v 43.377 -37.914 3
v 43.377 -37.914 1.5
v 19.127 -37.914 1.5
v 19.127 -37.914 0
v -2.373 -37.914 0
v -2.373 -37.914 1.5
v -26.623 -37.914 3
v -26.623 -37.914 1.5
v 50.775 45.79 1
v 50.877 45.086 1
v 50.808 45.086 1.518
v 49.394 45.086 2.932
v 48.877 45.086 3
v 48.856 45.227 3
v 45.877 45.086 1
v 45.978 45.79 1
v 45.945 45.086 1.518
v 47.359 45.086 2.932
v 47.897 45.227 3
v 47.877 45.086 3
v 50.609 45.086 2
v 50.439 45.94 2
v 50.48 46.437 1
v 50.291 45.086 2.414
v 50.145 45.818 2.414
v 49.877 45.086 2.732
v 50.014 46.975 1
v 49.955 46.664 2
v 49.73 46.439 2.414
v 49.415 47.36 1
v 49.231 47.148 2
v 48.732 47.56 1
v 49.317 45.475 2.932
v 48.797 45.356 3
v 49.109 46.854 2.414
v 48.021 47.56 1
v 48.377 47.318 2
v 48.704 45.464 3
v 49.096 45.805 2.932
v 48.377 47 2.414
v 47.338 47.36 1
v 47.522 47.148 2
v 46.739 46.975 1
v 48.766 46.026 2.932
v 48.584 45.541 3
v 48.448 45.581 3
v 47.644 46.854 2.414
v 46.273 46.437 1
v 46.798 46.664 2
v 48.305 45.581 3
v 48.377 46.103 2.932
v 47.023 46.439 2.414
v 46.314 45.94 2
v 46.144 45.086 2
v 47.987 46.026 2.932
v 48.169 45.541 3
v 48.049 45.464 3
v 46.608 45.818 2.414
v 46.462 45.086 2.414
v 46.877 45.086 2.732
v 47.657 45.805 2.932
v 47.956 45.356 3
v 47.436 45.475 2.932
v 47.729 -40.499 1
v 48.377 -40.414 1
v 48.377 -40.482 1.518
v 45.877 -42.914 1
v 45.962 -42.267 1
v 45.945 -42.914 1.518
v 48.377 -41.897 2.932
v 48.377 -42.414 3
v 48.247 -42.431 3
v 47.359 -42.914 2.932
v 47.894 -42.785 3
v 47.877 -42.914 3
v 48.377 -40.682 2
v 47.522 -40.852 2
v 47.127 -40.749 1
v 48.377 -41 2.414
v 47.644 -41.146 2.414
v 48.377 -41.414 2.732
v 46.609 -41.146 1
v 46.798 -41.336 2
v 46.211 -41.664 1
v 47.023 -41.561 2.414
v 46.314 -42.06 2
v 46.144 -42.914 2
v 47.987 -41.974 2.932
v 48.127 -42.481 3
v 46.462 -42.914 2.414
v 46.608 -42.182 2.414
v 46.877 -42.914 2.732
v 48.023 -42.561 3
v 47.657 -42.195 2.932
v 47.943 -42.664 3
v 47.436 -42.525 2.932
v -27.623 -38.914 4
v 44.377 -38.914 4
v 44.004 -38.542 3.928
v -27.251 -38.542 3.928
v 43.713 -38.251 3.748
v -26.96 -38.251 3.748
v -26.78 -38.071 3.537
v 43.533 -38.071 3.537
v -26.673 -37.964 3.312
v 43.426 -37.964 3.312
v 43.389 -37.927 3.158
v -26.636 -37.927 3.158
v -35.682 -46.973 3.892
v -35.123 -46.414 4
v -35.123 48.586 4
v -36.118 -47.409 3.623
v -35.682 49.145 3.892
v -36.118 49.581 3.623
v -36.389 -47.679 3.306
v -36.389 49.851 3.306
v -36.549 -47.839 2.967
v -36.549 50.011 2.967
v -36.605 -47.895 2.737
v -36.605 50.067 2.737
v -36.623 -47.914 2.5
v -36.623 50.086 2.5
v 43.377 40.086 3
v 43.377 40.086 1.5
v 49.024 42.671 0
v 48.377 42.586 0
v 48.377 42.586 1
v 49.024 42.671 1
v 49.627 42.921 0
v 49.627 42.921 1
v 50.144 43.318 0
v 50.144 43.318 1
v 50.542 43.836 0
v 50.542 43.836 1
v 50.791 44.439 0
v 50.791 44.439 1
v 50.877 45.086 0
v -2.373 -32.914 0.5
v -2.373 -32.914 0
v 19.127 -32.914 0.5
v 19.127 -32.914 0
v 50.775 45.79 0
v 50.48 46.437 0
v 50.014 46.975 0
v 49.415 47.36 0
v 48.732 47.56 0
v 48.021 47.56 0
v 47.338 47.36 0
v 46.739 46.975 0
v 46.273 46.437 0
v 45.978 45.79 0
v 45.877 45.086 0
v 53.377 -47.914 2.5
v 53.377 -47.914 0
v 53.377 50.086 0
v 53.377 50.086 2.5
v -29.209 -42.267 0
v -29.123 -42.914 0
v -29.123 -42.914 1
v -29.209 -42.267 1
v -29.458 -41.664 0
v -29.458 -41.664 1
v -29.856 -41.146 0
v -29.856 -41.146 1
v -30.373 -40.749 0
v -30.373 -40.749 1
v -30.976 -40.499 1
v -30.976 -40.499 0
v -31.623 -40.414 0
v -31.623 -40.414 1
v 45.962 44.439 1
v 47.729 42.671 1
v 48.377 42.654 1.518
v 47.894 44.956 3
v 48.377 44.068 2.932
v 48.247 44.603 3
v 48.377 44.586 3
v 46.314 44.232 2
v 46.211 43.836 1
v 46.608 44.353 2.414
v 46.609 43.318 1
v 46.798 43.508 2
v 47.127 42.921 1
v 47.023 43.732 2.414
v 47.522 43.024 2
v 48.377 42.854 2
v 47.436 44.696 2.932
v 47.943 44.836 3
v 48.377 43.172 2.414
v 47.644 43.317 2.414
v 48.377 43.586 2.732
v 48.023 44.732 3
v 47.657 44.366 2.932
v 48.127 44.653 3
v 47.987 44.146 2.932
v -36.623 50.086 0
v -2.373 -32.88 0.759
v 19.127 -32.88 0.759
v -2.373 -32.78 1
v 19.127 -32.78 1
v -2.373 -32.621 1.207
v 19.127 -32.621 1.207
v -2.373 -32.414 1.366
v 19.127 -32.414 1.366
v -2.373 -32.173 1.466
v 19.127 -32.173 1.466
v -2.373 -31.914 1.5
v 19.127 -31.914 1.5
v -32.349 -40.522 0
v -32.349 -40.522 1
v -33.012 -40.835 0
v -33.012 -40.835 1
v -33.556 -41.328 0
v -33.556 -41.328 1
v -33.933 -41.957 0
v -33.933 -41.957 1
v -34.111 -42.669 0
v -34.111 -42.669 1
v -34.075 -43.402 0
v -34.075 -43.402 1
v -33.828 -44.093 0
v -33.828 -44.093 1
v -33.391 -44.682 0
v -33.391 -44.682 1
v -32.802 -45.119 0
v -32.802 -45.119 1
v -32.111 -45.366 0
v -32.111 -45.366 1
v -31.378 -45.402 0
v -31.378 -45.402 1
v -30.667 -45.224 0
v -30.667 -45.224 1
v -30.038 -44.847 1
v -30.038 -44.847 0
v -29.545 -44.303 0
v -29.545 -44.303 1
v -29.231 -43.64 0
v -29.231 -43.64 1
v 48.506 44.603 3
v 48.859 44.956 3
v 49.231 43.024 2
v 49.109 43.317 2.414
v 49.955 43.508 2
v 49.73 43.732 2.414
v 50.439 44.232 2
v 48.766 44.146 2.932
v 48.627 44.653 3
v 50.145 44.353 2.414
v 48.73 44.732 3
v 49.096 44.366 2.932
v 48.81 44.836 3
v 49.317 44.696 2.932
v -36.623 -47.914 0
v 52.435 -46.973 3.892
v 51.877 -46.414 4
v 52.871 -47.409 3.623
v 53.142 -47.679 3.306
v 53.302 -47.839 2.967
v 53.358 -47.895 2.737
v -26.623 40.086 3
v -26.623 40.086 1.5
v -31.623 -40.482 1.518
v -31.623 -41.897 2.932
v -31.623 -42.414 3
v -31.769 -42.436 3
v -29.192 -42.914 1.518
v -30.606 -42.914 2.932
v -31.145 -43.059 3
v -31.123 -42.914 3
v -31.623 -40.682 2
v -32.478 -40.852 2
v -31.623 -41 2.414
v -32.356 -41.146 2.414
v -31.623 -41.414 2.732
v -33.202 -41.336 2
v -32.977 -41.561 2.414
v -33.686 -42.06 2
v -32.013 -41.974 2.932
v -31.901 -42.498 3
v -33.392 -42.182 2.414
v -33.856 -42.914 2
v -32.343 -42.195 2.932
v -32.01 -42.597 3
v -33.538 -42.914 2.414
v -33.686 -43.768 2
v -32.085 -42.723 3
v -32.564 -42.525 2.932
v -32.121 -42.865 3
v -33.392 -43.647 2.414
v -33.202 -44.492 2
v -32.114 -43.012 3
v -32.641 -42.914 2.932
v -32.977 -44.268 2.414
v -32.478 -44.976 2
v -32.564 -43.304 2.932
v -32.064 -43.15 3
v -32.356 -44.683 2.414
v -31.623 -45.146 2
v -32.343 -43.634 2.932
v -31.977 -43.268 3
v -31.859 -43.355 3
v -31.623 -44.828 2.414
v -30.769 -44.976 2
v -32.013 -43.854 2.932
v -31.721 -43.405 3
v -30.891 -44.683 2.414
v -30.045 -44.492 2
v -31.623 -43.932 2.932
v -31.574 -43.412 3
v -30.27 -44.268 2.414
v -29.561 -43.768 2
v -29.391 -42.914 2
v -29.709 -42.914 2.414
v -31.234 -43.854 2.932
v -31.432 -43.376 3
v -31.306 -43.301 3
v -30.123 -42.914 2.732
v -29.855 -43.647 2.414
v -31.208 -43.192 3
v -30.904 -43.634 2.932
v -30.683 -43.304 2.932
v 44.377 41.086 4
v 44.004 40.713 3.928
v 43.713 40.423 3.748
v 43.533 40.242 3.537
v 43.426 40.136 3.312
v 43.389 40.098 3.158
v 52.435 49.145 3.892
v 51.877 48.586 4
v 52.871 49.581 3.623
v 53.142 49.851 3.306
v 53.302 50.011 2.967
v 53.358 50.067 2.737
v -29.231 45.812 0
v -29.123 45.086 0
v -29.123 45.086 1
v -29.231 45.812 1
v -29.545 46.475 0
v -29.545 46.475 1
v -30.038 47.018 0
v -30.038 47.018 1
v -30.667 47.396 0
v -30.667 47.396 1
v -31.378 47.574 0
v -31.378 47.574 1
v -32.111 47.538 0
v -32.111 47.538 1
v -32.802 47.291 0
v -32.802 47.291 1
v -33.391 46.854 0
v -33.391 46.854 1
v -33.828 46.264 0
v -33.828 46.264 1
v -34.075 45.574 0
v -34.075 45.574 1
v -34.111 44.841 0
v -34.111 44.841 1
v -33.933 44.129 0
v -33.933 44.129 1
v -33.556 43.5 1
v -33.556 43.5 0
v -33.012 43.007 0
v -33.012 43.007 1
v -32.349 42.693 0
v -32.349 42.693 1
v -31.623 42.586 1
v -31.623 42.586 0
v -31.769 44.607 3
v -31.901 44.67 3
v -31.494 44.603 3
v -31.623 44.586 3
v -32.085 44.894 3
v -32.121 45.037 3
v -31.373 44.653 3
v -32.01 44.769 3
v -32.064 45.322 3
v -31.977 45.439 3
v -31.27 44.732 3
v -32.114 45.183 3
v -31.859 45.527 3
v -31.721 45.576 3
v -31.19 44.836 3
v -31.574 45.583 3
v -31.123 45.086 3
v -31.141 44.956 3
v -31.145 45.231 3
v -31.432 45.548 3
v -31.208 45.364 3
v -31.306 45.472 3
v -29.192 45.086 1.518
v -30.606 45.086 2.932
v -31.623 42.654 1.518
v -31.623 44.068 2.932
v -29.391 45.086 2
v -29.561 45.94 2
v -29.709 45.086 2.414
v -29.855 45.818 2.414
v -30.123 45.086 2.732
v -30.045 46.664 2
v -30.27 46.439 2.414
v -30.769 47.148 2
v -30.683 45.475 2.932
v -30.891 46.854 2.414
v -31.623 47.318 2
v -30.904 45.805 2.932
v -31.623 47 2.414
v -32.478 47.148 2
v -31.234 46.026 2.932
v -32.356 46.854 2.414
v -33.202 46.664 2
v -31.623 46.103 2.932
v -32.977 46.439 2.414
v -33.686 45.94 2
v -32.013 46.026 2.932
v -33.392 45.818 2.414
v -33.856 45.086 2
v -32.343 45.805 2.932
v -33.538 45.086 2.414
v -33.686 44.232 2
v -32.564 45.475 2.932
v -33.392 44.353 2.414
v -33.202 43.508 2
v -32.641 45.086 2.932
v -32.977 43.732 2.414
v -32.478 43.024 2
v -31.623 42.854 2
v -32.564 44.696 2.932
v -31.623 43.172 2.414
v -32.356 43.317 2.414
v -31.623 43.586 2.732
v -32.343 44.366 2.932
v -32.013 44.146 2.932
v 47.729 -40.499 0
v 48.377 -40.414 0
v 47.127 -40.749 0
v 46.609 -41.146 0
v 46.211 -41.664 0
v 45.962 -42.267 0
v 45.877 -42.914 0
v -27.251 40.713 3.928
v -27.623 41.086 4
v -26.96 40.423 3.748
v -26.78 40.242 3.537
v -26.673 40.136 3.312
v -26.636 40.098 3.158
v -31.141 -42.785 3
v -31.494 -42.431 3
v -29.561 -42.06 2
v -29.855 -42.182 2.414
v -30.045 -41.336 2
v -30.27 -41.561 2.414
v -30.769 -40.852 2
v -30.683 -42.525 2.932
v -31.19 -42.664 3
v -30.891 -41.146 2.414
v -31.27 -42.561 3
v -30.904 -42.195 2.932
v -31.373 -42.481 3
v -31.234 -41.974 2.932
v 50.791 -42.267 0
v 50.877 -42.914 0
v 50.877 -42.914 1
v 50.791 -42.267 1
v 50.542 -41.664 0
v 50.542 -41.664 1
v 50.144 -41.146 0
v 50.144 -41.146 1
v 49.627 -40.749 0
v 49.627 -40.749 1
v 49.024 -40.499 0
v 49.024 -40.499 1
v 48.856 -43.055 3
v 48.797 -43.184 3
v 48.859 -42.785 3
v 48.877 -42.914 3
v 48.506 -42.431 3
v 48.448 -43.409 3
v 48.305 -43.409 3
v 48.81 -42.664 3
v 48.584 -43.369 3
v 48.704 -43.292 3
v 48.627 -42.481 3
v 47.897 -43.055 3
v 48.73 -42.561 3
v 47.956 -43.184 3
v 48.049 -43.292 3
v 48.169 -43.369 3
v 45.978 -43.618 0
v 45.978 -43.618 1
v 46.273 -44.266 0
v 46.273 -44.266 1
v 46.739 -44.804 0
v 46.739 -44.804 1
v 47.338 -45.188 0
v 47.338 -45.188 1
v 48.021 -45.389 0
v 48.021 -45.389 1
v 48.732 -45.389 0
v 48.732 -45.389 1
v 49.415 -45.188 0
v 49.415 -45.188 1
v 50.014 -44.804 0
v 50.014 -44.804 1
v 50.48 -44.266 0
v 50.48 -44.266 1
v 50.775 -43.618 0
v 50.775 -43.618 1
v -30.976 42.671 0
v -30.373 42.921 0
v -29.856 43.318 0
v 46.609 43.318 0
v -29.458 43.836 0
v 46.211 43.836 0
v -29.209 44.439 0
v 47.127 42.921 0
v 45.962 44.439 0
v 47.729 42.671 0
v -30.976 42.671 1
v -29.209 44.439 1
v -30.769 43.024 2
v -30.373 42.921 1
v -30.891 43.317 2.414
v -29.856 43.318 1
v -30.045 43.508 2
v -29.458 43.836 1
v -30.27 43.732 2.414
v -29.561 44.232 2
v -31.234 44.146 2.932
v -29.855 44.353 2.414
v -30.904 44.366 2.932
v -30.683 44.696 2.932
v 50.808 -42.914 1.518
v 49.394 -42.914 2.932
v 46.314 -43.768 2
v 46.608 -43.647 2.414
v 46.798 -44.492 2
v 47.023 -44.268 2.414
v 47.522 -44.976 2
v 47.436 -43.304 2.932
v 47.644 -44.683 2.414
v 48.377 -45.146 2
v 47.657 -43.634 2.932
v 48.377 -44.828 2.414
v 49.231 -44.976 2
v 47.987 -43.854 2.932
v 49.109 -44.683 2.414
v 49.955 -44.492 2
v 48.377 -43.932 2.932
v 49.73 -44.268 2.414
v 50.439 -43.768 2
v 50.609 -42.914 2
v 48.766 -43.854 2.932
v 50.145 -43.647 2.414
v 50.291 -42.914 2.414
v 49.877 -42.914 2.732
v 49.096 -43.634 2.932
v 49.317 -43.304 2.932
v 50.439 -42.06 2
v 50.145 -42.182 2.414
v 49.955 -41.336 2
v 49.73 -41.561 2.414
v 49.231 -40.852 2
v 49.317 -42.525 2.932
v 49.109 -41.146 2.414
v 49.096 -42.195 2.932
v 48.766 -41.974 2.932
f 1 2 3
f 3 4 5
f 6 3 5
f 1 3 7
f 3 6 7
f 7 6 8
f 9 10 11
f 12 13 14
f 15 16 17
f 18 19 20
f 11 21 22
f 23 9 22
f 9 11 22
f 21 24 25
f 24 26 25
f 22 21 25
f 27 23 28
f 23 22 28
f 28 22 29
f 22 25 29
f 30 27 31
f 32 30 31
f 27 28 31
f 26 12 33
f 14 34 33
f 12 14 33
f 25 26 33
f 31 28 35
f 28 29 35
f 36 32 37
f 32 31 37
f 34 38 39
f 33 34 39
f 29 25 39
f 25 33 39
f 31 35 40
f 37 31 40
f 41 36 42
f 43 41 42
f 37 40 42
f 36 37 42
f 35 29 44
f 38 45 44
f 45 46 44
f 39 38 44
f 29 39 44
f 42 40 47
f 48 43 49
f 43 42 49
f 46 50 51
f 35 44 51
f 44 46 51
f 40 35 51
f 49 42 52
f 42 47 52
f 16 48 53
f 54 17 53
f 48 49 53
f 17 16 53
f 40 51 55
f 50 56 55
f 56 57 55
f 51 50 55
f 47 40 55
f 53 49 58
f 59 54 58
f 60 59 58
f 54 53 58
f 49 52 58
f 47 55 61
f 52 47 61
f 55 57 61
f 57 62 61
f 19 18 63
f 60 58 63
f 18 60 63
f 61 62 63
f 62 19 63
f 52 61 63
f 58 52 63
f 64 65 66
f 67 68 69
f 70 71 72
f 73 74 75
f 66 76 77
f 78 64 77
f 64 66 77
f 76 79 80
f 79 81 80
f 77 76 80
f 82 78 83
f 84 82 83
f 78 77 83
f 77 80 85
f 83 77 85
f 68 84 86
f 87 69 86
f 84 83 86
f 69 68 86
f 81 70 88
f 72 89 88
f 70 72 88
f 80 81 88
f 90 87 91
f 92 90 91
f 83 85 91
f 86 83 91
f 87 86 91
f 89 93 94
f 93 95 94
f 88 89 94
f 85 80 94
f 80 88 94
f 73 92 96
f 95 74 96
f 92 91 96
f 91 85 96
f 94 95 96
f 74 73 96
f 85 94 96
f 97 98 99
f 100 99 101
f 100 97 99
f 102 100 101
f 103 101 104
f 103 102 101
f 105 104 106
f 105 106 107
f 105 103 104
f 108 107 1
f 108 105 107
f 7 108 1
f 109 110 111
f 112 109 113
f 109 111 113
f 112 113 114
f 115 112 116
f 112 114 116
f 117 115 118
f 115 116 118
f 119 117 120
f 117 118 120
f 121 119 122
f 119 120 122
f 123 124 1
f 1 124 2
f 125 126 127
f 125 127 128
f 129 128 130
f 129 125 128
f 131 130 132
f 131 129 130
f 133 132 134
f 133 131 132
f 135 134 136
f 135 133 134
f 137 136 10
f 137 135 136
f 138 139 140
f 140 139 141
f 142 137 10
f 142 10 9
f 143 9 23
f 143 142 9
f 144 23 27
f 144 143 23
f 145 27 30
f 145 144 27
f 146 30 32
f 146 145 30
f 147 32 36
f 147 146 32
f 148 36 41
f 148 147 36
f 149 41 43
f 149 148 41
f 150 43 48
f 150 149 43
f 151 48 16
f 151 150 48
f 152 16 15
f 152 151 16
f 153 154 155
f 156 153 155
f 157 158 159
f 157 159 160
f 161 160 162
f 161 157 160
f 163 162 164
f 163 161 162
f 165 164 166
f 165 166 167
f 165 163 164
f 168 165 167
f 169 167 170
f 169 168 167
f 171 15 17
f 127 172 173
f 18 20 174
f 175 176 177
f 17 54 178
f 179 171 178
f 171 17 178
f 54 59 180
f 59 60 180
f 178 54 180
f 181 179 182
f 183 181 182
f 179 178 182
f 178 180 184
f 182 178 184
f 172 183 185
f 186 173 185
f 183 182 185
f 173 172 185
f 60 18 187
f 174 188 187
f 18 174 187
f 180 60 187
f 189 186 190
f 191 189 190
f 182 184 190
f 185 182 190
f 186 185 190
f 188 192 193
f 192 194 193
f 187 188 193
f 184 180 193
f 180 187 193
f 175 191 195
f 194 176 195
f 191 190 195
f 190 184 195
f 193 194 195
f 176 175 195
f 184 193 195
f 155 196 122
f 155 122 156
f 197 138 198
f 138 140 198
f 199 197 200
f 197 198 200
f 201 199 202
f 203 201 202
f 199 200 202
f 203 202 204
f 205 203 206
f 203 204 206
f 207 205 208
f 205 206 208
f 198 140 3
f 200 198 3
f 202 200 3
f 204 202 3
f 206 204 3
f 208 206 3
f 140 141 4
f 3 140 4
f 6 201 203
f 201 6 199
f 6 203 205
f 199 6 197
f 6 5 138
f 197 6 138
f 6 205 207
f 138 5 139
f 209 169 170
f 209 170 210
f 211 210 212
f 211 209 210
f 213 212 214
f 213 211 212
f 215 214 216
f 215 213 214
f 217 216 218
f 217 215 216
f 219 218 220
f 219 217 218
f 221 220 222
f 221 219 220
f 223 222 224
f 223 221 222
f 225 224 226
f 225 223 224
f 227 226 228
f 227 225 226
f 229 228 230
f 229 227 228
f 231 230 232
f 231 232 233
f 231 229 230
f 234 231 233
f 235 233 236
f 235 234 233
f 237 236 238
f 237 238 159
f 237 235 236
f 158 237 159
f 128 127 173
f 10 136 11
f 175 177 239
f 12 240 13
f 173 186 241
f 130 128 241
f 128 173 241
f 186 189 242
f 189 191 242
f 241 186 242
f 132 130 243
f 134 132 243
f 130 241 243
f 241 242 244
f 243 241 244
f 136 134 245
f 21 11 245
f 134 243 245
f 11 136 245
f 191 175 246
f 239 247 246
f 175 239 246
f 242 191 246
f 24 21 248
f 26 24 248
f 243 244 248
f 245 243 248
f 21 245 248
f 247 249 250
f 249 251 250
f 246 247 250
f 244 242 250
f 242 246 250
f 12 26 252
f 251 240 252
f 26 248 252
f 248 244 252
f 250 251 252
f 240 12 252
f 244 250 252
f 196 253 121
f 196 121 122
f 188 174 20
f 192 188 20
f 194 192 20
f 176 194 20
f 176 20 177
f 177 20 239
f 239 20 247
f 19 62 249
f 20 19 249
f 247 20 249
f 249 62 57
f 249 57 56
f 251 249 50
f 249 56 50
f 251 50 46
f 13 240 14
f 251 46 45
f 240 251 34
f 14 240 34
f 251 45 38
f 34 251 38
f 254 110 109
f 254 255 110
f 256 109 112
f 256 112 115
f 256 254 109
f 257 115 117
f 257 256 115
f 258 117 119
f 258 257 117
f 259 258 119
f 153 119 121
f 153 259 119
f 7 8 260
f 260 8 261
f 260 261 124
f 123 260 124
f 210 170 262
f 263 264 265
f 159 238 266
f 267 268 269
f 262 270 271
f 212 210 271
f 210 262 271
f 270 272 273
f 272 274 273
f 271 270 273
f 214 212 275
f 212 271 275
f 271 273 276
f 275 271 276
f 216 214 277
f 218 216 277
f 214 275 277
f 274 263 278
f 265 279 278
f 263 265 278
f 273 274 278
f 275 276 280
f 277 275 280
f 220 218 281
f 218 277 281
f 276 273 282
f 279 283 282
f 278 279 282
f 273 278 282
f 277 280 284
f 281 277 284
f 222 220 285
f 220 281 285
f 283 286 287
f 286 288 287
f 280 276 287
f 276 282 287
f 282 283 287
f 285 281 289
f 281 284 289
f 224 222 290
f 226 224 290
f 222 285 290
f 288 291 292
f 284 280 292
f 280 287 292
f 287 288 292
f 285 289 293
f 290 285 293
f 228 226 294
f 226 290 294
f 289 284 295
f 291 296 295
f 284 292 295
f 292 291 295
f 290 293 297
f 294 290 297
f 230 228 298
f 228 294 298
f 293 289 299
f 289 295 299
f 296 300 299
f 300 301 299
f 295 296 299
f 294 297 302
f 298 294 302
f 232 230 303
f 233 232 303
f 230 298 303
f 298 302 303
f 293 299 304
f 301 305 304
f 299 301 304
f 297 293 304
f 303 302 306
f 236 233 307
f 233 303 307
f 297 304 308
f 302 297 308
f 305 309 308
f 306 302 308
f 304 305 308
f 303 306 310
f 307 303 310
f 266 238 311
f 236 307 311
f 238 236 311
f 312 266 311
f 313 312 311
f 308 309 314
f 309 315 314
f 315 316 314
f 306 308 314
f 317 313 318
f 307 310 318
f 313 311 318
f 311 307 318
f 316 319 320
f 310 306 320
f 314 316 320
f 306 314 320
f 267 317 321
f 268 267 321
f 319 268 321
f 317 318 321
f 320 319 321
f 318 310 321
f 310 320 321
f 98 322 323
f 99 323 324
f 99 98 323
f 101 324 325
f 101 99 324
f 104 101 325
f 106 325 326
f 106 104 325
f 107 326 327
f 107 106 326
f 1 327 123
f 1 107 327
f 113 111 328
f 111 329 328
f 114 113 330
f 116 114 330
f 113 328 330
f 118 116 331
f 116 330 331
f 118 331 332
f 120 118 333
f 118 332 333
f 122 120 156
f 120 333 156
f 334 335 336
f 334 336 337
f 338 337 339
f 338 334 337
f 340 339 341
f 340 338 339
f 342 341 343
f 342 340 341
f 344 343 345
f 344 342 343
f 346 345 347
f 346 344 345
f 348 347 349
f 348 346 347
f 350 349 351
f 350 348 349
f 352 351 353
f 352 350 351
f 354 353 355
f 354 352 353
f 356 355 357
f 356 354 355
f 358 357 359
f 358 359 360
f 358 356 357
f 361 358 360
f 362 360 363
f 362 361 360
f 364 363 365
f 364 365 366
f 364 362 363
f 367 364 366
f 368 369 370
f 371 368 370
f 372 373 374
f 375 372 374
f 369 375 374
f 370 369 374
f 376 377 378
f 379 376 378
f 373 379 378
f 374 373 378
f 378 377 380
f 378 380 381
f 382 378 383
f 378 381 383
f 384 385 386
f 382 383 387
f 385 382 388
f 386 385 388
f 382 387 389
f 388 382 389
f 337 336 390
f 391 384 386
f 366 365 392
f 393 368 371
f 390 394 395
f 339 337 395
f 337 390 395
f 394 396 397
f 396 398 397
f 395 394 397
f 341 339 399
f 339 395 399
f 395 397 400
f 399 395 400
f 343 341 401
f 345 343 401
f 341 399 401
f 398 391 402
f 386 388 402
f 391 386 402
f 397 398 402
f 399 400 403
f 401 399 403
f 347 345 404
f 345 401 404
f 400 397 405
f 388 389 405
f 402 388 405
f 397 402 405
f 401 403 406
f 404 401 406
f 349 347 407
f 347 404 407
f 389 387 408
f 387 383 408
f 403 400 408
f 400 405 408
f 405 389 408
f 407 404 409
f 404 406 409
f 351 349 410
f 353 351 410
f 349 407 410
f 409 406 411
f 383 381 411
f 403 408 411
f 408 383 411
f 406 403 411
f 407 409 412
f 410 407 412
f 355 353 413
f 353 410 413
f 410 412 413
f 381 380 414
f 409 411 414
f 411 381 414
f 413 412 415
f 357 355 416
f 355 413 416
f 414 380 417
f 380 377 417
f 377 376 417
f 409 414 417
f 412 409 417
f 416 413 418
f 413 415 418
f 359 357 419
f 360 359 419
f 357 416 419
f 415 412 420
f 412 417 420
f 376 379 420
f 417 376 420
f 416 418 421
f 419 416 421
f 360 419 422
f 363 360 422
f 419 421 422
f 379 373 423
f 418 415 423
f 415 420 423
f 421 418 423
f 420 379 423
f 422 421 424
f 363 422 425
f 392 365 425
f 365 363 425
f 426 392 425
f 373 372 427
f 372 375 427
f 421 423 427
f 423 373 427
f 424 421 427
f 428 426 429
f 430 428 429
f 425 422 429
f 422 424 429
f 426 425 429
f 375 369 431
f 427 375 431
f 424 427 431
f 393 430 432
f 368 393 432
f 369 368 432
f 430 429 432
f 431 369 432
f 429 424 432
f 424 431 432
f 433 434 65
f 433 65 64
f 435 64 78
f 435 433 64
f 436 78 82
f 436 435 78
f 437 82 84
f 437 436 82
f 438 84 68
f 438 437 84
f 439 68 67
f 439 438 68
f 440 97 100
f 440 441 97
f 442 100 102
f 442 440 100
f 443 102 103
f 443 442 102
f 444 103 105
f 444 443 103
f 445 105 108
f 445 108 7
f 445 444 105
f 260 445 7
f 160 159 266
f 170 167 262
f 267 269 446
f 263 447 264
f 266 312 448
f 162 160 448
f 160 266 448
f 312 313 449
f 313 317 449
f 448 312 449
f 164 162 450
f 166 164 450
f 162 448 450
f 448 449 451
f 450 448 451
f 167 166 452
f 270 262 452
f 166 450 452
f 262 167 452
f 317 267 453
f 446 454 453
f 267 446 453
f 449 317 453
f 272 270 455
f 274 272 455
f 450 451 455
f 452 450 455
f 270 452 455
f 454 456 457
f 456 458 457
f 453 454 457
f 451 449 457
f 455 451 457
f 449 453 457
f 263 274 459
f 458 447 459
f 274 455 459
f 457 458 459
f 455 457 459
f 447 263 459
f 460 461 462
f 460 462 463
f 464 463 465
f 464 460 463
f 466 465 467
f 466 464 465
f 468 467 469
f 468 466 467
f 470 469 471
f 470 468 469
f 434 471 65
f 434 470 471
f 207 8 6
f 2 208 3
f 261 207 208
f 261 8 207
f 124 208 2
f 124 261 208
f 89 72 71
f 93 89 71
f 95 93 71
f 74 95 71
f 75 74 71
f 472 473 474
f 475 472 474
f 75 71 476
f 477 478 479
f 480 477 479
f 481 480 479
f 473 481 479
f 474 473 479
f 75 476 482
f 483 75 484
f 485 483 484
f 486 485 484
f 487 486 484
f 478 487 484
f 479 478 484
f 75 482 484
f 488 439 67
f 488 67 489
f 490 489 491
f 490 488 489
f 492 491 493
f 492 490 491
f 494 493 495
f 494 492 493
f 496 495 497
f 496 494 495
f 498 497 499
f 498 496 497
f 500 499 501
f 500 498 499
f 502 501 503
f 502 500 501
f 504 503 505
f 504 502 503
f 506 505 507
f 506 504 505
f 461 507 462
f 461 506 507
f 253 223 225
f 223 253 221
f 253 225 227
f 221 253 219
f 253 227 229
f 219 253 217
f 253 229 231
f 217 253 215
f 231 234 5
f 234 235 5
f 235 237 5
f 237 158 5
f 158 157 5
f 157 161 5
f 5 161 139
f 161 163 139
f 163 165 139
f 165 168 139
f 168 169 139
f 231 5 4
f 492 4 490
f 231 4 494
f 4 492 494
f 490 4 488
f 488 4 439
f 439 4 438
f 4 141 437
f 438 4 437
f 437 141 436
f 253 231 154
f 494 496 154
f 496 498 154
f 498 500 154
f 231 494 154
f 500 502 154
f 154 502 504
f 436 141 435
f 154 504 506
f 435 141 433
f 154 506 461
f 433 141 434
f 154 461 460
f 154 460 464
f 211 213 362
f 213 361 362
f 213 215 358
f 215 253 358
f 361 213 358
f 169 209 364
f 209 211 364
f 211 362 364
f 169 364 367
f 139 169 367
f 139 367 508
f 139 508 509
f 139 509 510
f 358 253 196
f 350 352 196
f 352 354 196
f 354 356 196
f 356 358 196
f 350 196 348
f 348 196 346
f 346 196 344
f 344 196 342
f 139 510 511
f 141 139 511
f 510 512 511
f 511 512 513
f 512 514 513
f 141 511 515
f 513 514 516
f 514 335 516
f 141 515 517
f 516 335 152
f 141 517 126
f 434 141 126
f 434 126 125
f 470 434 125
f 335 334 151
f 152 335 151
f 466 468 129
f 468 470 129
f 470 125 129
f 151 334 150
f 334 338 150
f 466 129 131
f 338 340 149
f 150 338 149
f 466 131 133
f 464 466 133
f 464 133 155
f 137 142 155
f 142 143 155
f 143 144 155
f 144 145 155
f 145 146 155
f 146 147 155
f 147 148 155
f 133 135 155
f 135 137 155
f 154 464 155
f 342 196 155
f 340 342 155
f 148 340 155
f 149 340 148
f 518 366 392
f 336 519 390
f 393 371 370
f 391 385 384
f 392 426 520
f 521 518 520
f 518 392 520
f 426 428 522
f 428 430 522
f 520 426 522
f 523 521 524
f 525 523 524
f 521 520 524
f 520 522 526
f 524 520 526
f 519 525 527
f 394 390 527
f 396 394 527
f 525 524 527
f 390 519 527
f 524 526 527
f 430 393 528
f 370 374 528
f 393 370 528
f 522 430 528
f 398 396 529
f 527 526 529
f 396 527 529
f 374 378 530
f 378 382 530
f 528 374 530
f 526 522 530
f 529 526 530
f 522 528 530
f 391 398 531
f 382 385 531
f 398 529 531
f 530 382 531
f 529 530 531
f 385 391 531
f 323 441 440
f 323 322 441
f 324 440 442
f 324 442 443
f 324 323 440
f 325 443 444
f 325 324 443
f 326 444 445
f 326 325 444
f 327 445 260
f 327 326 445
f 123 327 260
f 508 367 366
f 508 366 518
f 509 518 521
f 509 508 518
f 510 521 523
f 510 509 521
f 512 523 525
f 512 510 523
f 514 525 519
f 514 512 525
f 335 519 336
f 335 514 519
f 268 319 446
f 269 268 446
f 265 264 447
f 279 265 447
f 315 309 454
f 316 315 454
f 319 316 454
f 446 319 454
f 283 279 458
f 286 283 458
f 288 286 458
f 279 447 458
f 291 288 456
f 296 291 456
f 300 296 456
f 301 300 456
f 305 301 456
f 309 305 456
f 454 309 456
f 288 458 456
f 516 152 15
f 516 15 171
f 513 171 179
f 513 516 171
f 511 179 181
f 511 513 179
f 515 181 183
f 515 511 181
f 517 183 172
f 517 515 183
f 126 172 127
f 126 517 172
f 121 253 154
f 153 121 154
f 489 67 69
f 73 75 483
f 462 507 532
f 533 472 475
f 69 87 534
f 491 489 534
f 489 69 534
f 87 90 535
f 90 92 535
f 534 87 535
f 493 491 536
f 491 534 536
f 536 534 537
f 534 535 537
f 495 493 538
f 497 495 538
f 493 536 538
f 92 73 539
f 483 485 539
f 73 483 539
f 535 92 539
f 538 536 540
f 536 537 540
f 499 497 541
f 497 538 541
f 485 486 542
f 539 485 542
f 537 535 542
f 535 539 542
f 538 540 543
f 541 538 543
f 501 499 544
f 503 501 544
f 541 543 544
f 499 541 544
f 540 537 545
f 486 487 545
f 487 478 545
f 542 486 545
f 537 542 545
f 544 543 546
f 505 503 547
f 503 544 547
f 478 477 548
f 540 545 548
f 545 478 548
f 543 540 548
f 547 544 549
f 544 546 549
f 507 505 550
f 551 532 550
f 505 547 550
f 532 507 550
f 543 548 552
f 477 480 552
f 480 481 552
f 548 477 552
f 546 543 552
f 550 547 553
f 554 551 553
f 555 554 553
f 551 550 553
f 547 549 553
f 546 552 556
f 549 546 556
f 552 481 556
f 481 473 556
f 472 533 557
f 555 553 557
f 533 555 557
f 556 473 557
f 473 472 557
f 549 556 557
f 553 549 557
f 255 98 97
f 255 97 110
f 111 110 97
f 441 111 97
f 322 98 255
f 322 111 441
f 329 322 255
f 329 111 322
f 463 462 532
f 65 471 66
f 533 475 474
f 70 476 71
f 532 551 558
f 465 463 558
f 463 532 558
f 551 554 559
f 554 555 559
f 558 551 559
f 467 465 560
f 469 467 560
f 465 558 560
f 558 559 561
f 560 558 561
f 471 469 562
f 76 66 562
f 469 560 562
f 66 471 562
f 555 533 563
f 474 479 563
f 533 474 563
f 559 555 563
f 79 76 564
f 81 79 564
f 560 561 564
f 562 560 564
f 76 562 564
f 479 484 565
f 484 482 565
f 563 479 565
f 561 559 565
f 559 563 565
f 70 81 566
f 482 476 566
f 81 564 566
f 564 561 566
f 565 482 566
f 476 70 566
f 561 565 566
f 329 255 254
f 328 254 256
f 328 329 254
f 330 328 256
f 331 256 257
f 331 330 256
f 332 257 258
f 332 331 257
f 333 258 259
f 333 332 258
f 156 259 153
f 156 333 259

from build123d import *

# Parameters (mm, degrees)
F1_DEPTH = 1.5
F0_W     = 90
F0_H     = 98
F2_DEPTH = 4
F3_R     = 1
F4_R     = 1.5
F5_DEPTH = 3
F6_R     = 2


with BuildPart() as f1:
    # F0 (on Top) → F1 (new body)
    with BuildSketch(Plane.XY):
        Polygon((43.3765034378, 40.0858414471), (-26.6234965622, 40.0858414471), (-26.6234965622, -37.9141585529), (-2.3734965622, -37.9141585529), (-2.3734965622, -32.9141585529), (19.1265034378, -32.9141585529), (19.1265034378, -37.9141585529), (43.3765034378, -37.9141585529), align=None)
    extrude(amount=F1_DEPTH)

    # F0 (on Top) → F2 (join)
    with BuildSketch(Plane.XY):
        with Locations((8.3765034378, 1.0858414471)):
            Rectangle(F0_W, F0_H)
        with BuildLine():
            ThreePointArc((-31.6234965622, 42.5858414471), (-33.3912635152, 46.8536084001), (-29.1234965622, 45.0858414471))
            Line((-29.1234965622, 45.0858414471), (45.8765034378, 45.0858414471))
            ThreePointArc((45.8765034378, 45.0858414471), (48.3765034378, 47.5858414471), (50.8765034378, 45.0858414471))
            ThreePointArc((50.8765034378, 45.0858414471), (50.1442703907, 43.3180744941), (48.3765034378, 42.5858414471))
            Line((48.3765034378, 42.5858414471), (48.3765034378, -40.4141585529))
            ThreePointArc((48.3765034378, -40.4141585529), (50.1442703907, -41.1463915999), (50.8765034378, -42.9141585529))
            ThreePointArc((50.8765034378, -42.9141585529), (48.3765034378, -45.4141585529), (45.8765034378, -42.9141585529))
            Line((45.8765034378, -42.9141585529), (-29.1234965622, -42.9141585529))
            ThreePointArc((-29.1234965622, -42.9141585529), (-33.3912635152, -44.6819255059), (-31.6234965622, -40.4141585529))
            Line((-31.6234965622, -40.4141585529), (-31.6234965622, 42.5858414471))
        make_face(mode=Mode.SUBTRACT)
        with BuildLine():
            Line((-31.6234965622, -42.9141585529), (-31.6234965622, -40.4141585529))
            ThreePointArc((-31.6234965622, -40.4141585529), (-33.3912635152, -44.6819255059), (-29.1234965622, -42.9141585529))
            Line((-29.1234965622, -42.9141585529), (-31.6234965622, -42.9141585529))
        make_face()
        with BuildLine():
            Line((45.8765034378, 45.0858414471), (-29.1234965622, 45.0858414471))
            ThreePointArc((-29.1234965622, 45.0858414471), (-29.8557296093, 43.3180744941), (-31.6234965622, 42.5858414471))
            Line((-31.6234965622, 42.5858414471), (-31.6234965622, -40.4141585529))
            ThreePointArc((-31.6234965622, -40.4141585529), (-29.8557296093, -41.1463915999), (-29.1234965622, -42.9141585529))
            Line((-29.1234965622, -42.9141585529), (45.8765034378, -42.9141585529))
            ThreePointArc((45.8765034378, -42.9141585529), (46.6087364848, -41.1463915999), (48.3765034378, -40.4141585529))
            Line((48.3765034378, -40.4141585529), (48.3765034378, 42.5858414471))
            ThreePointArc((48.3765034378, 42.5858414471), (46.6087364848, 43.3180744941), (45.8765034378, 45.0858414471))
        make_face()
        Polygon((-26.6234965622, -37.9141585529), (-26.6234965622, 40.0858414471), (43.3765034378, 40.0858414471), (43.3765034378, -37.9141585529), (19.1265034378, -37.9141585529), (-2.3734965622, -37.9141585529), align=None, mode=Mode.SUBTRACT)
        with BuildLine():
            ThreePointArc((-29.1234965622, -42.9141585529), (-29.8557296093, -41.1463915999), (-31.6234965622, -40.4141585529))
            Line((-31.6234965622, -40.4141585529), (-31.6234965622, -42.9141585529))
            Line((-31.6234965622, -42.9141585529), (-29.1234965622, -42.9141585529))
        make_face()
        with BuildLine():
            ThreePointArc((50.8765034378, -42.9141585529), (50.1442703907, -41.1463915999), (48.3765034378, -40.4141585529))
            Line((48.3765034378, -40.4141585529), (48.3765034378, -42.9141585529))
            Line((48.3765034378, -42.9141585529), (45.8765034378, -42.9141585529))
            ThreePointArc((45.8765034378, -42.9141585529), (48.3765034378, -45.4141585529), (50.8765034378, -42.9141585529))
        make_face()
        with BuildLine():
            Line((48.3765034378, -42.9141585529), (48.3765034378, -40.4141585529))
            ThreePointArc((48.3765034378, -40.4141585529), (46.6087364848, -41.1463915999), (45.8765034378, -42.9141585529))
            Line((45.8765034378, -42.9141585529), (48.3765034378, -42.9141585529))
        make_face()
        with BuildLine():
            Line((48.3765034378, 45.0858414471), (45.8765034378, 45.0858414471))
            ThreePointArc((45.8765034378, 45.0858414471), (46.6087364848, 43.3180744941), (48.3765034378, 42.5858414471))
            Line((48.3765034378, 42.5858414471), (48.3765034378, 45.0858414471))
        make_face()
        with BuildLine():
            ThreePointArc((50.8765034378, 45.0858414471), (48.3765034378, 47.5858414471), (45.8765034378, 45.0858414471))
            Line((45.8765034378, 45.0858414471), (48.3765034378, 45.0858414471))
            Line((48.3765034378, 45.0858414471), (48.3765034378, 42.5858414471))
            ThreePointArc((48.3765034378, 42.5858414471), (50.1442703907, 43.3180744941), (50.8765034378, 45.0858414471))
        make_face()
        with BuildLine():
            Line((-31.6234965622, 42.5858414471), (-31.6234965622, 45.0858414471))
            Line((-31.6234965622, 45.0858414471), (-29.1234965622, 45.0858414471))
            ThreePointArc((-29.1234965622, 45.0858414471), (-33.3912635152, 46.8536084001), (-31.6234965622, 42.5858414471))
        make_face()
        with BuildLine():
            Line((-29.1234965622, 45.0858414471), (-31.6234965622, 45.0858414471))
            Line((-31.6234965622, 45.0858414471), (-31.6234965622, 42.5858414471))
            ThreePointArc((-31.6234965622, 42.5858414471), (-29.8557296093, 43.3180744941), (-29.1234965622, 45.0858414471))
        make_face()
    extrude(amount=F2_DEPTH)

    # F3
    f3_edges = [f1.edges().sort_by_distance(p)[0] for p in [
        (8.376503, -32.914159, 1.5),
        (-26.623497, 1.085841, 4),
        (8.376503, -37.914159, 4),
        (43.376503, 1.085841, 4),
        (8.376503, 40.085841, 4),
    ]]
    fillet(f3_edges, radius=F3_R)

    # F4
    f4_edges = [f1.edges().sort_by_distance(p)[0] for p in [
        (-36.623497, 1.085841, 4),
        (8.376503, 50.085841, 4),
        (53.376503, 1.085841, 4),
        (8.376503, -47.914159, 4),
    ]]
    fillet(f4_edges, radius=F4_R)

    # F0 (on Top) → F5 (cut)
    with BuildSketch(Plane.XY):
        with BuildLine():
            Line((48.3765034378, 45.0858414471), (45.8765034378, 45.0858414471))
            ThreePointArc((45.8765034378, 45.0858414471), (46.6087364848, 43.3180744941), (48.3765034378, 42.5858414471))
            Line((48.3765034378, 42.5858414471), (48.3765034378, 45.0858414471))
        make_face()
        with BuildLine():
            ThreePointArc((50.8765034378, 45.0858414471), (48.3765034378, 47.5858414471), (45.8765034378, 45.0858414471))
            Line((45.8765034378, 45.0858414471), (48.3765034378, 45.0858414471))
            Line((48.3765034378, 45.0858414471), (48.3765034378, 42.5858414471))
            ThreePointArc((48.3765034378, 42.5858414471), (50.1442703907, 43.3180744941), (50.8765034378, 45.0858414471))
        make_face()
        with BuildLine():
            Line((-31.6234965622, 42.5858414471), (-31.6234965622, 45.0858414471))
            Line((-31.6234965622, 45.0858414471), (-29.1234965622, 45.0858414471))
            ThreePointArc((-29.1234965622, 45.0858414471), (-33.3912635152, 46.8536084001), (-31.6234965622, 42.5858414471))
        make_face()
        with BuildLine():
            Line((-29.1234965622, 45.0858414471), (-31.6234965622, 45.0858414471))
            Line((-31.6234965622, 45.0858414471), (-31.6234965622, 42.5858414471))
            ThreePointArc((-31.6234965622, 42.5858414471), (-29.8557296093, 43.3180744941), (-29.1234965622, 45.0858414471))
        make_face()
        with BuildLine():
            Line((48.3765034378, -42.9141585529), (48.3765034378, -40.4141585529))
            ThreePointArc((48.3765034378, -40.4141585529), (46.6087364848, -41.1463915999), (45.8765034378, -42.9141585529))
            Line((45.8765034378, -42.9141585529), (48.3765034378, -42.9141585529))
        make_face()
        with BuildLine():
            ThreePointArc((50.8765034378, -42.9141585529), (50.1442703907, -41.1463915999), (48.3765034378, -40.4141585529))
            Line((48.3765034378, -40.4141585529), (48.3765034378, -42.9141585529))
            Line((48.3765034378, -42.9141585529), (45.8765034378, -42.9141585529))
            ThreePointArc((45.8765034378, -42.9141585529), (48.3765034378, -45.4141585529), (50.8765034378, -42.9141585529))
        make_face()
        with BuildLine():
            Line((-31.6234965622, -42.9141585529), (-31.6234965622, -40.4141585529))
            ThreePointArc((-31.6234965622, -40.4141585529), (-33.3912635152, -44.6819255059), (-29.1234965622, -42.9141585529))
            Line((-29.1234965622, -42.9141585529), (-31.6234965622, -42.9141585529))
        make_face()
        with BuildLine():
            ThreePointArc((-29.1234965622, -42.9141585529), (-29.8557296093, -41.1463915999), (-31.6234965622, -40.4141585529))
            Line((-31.6234965622, -40.4141585529), (-31.6234965622, -42.9141585529))
            Line((-31.6234965622, -42.9141585529), (-29.1234965622, -42.9141585529))
        make_face()
    extrude(amount=F5_DEPTH, mode=Mode.SUBTRACT)

    # F6
    f6_edges = [f1.edges().sort_by_distance(p)[0] for p in [
        (50.876503, -42.914159, 3),
        (48.376503, 47.585841, 3),
        (-31.623497, 47.585841, 3),
        (-34.123497, -42.914159, 3),
    ]]
    fillet(f6_edges, radius=F6_R)


solid = f1.part
